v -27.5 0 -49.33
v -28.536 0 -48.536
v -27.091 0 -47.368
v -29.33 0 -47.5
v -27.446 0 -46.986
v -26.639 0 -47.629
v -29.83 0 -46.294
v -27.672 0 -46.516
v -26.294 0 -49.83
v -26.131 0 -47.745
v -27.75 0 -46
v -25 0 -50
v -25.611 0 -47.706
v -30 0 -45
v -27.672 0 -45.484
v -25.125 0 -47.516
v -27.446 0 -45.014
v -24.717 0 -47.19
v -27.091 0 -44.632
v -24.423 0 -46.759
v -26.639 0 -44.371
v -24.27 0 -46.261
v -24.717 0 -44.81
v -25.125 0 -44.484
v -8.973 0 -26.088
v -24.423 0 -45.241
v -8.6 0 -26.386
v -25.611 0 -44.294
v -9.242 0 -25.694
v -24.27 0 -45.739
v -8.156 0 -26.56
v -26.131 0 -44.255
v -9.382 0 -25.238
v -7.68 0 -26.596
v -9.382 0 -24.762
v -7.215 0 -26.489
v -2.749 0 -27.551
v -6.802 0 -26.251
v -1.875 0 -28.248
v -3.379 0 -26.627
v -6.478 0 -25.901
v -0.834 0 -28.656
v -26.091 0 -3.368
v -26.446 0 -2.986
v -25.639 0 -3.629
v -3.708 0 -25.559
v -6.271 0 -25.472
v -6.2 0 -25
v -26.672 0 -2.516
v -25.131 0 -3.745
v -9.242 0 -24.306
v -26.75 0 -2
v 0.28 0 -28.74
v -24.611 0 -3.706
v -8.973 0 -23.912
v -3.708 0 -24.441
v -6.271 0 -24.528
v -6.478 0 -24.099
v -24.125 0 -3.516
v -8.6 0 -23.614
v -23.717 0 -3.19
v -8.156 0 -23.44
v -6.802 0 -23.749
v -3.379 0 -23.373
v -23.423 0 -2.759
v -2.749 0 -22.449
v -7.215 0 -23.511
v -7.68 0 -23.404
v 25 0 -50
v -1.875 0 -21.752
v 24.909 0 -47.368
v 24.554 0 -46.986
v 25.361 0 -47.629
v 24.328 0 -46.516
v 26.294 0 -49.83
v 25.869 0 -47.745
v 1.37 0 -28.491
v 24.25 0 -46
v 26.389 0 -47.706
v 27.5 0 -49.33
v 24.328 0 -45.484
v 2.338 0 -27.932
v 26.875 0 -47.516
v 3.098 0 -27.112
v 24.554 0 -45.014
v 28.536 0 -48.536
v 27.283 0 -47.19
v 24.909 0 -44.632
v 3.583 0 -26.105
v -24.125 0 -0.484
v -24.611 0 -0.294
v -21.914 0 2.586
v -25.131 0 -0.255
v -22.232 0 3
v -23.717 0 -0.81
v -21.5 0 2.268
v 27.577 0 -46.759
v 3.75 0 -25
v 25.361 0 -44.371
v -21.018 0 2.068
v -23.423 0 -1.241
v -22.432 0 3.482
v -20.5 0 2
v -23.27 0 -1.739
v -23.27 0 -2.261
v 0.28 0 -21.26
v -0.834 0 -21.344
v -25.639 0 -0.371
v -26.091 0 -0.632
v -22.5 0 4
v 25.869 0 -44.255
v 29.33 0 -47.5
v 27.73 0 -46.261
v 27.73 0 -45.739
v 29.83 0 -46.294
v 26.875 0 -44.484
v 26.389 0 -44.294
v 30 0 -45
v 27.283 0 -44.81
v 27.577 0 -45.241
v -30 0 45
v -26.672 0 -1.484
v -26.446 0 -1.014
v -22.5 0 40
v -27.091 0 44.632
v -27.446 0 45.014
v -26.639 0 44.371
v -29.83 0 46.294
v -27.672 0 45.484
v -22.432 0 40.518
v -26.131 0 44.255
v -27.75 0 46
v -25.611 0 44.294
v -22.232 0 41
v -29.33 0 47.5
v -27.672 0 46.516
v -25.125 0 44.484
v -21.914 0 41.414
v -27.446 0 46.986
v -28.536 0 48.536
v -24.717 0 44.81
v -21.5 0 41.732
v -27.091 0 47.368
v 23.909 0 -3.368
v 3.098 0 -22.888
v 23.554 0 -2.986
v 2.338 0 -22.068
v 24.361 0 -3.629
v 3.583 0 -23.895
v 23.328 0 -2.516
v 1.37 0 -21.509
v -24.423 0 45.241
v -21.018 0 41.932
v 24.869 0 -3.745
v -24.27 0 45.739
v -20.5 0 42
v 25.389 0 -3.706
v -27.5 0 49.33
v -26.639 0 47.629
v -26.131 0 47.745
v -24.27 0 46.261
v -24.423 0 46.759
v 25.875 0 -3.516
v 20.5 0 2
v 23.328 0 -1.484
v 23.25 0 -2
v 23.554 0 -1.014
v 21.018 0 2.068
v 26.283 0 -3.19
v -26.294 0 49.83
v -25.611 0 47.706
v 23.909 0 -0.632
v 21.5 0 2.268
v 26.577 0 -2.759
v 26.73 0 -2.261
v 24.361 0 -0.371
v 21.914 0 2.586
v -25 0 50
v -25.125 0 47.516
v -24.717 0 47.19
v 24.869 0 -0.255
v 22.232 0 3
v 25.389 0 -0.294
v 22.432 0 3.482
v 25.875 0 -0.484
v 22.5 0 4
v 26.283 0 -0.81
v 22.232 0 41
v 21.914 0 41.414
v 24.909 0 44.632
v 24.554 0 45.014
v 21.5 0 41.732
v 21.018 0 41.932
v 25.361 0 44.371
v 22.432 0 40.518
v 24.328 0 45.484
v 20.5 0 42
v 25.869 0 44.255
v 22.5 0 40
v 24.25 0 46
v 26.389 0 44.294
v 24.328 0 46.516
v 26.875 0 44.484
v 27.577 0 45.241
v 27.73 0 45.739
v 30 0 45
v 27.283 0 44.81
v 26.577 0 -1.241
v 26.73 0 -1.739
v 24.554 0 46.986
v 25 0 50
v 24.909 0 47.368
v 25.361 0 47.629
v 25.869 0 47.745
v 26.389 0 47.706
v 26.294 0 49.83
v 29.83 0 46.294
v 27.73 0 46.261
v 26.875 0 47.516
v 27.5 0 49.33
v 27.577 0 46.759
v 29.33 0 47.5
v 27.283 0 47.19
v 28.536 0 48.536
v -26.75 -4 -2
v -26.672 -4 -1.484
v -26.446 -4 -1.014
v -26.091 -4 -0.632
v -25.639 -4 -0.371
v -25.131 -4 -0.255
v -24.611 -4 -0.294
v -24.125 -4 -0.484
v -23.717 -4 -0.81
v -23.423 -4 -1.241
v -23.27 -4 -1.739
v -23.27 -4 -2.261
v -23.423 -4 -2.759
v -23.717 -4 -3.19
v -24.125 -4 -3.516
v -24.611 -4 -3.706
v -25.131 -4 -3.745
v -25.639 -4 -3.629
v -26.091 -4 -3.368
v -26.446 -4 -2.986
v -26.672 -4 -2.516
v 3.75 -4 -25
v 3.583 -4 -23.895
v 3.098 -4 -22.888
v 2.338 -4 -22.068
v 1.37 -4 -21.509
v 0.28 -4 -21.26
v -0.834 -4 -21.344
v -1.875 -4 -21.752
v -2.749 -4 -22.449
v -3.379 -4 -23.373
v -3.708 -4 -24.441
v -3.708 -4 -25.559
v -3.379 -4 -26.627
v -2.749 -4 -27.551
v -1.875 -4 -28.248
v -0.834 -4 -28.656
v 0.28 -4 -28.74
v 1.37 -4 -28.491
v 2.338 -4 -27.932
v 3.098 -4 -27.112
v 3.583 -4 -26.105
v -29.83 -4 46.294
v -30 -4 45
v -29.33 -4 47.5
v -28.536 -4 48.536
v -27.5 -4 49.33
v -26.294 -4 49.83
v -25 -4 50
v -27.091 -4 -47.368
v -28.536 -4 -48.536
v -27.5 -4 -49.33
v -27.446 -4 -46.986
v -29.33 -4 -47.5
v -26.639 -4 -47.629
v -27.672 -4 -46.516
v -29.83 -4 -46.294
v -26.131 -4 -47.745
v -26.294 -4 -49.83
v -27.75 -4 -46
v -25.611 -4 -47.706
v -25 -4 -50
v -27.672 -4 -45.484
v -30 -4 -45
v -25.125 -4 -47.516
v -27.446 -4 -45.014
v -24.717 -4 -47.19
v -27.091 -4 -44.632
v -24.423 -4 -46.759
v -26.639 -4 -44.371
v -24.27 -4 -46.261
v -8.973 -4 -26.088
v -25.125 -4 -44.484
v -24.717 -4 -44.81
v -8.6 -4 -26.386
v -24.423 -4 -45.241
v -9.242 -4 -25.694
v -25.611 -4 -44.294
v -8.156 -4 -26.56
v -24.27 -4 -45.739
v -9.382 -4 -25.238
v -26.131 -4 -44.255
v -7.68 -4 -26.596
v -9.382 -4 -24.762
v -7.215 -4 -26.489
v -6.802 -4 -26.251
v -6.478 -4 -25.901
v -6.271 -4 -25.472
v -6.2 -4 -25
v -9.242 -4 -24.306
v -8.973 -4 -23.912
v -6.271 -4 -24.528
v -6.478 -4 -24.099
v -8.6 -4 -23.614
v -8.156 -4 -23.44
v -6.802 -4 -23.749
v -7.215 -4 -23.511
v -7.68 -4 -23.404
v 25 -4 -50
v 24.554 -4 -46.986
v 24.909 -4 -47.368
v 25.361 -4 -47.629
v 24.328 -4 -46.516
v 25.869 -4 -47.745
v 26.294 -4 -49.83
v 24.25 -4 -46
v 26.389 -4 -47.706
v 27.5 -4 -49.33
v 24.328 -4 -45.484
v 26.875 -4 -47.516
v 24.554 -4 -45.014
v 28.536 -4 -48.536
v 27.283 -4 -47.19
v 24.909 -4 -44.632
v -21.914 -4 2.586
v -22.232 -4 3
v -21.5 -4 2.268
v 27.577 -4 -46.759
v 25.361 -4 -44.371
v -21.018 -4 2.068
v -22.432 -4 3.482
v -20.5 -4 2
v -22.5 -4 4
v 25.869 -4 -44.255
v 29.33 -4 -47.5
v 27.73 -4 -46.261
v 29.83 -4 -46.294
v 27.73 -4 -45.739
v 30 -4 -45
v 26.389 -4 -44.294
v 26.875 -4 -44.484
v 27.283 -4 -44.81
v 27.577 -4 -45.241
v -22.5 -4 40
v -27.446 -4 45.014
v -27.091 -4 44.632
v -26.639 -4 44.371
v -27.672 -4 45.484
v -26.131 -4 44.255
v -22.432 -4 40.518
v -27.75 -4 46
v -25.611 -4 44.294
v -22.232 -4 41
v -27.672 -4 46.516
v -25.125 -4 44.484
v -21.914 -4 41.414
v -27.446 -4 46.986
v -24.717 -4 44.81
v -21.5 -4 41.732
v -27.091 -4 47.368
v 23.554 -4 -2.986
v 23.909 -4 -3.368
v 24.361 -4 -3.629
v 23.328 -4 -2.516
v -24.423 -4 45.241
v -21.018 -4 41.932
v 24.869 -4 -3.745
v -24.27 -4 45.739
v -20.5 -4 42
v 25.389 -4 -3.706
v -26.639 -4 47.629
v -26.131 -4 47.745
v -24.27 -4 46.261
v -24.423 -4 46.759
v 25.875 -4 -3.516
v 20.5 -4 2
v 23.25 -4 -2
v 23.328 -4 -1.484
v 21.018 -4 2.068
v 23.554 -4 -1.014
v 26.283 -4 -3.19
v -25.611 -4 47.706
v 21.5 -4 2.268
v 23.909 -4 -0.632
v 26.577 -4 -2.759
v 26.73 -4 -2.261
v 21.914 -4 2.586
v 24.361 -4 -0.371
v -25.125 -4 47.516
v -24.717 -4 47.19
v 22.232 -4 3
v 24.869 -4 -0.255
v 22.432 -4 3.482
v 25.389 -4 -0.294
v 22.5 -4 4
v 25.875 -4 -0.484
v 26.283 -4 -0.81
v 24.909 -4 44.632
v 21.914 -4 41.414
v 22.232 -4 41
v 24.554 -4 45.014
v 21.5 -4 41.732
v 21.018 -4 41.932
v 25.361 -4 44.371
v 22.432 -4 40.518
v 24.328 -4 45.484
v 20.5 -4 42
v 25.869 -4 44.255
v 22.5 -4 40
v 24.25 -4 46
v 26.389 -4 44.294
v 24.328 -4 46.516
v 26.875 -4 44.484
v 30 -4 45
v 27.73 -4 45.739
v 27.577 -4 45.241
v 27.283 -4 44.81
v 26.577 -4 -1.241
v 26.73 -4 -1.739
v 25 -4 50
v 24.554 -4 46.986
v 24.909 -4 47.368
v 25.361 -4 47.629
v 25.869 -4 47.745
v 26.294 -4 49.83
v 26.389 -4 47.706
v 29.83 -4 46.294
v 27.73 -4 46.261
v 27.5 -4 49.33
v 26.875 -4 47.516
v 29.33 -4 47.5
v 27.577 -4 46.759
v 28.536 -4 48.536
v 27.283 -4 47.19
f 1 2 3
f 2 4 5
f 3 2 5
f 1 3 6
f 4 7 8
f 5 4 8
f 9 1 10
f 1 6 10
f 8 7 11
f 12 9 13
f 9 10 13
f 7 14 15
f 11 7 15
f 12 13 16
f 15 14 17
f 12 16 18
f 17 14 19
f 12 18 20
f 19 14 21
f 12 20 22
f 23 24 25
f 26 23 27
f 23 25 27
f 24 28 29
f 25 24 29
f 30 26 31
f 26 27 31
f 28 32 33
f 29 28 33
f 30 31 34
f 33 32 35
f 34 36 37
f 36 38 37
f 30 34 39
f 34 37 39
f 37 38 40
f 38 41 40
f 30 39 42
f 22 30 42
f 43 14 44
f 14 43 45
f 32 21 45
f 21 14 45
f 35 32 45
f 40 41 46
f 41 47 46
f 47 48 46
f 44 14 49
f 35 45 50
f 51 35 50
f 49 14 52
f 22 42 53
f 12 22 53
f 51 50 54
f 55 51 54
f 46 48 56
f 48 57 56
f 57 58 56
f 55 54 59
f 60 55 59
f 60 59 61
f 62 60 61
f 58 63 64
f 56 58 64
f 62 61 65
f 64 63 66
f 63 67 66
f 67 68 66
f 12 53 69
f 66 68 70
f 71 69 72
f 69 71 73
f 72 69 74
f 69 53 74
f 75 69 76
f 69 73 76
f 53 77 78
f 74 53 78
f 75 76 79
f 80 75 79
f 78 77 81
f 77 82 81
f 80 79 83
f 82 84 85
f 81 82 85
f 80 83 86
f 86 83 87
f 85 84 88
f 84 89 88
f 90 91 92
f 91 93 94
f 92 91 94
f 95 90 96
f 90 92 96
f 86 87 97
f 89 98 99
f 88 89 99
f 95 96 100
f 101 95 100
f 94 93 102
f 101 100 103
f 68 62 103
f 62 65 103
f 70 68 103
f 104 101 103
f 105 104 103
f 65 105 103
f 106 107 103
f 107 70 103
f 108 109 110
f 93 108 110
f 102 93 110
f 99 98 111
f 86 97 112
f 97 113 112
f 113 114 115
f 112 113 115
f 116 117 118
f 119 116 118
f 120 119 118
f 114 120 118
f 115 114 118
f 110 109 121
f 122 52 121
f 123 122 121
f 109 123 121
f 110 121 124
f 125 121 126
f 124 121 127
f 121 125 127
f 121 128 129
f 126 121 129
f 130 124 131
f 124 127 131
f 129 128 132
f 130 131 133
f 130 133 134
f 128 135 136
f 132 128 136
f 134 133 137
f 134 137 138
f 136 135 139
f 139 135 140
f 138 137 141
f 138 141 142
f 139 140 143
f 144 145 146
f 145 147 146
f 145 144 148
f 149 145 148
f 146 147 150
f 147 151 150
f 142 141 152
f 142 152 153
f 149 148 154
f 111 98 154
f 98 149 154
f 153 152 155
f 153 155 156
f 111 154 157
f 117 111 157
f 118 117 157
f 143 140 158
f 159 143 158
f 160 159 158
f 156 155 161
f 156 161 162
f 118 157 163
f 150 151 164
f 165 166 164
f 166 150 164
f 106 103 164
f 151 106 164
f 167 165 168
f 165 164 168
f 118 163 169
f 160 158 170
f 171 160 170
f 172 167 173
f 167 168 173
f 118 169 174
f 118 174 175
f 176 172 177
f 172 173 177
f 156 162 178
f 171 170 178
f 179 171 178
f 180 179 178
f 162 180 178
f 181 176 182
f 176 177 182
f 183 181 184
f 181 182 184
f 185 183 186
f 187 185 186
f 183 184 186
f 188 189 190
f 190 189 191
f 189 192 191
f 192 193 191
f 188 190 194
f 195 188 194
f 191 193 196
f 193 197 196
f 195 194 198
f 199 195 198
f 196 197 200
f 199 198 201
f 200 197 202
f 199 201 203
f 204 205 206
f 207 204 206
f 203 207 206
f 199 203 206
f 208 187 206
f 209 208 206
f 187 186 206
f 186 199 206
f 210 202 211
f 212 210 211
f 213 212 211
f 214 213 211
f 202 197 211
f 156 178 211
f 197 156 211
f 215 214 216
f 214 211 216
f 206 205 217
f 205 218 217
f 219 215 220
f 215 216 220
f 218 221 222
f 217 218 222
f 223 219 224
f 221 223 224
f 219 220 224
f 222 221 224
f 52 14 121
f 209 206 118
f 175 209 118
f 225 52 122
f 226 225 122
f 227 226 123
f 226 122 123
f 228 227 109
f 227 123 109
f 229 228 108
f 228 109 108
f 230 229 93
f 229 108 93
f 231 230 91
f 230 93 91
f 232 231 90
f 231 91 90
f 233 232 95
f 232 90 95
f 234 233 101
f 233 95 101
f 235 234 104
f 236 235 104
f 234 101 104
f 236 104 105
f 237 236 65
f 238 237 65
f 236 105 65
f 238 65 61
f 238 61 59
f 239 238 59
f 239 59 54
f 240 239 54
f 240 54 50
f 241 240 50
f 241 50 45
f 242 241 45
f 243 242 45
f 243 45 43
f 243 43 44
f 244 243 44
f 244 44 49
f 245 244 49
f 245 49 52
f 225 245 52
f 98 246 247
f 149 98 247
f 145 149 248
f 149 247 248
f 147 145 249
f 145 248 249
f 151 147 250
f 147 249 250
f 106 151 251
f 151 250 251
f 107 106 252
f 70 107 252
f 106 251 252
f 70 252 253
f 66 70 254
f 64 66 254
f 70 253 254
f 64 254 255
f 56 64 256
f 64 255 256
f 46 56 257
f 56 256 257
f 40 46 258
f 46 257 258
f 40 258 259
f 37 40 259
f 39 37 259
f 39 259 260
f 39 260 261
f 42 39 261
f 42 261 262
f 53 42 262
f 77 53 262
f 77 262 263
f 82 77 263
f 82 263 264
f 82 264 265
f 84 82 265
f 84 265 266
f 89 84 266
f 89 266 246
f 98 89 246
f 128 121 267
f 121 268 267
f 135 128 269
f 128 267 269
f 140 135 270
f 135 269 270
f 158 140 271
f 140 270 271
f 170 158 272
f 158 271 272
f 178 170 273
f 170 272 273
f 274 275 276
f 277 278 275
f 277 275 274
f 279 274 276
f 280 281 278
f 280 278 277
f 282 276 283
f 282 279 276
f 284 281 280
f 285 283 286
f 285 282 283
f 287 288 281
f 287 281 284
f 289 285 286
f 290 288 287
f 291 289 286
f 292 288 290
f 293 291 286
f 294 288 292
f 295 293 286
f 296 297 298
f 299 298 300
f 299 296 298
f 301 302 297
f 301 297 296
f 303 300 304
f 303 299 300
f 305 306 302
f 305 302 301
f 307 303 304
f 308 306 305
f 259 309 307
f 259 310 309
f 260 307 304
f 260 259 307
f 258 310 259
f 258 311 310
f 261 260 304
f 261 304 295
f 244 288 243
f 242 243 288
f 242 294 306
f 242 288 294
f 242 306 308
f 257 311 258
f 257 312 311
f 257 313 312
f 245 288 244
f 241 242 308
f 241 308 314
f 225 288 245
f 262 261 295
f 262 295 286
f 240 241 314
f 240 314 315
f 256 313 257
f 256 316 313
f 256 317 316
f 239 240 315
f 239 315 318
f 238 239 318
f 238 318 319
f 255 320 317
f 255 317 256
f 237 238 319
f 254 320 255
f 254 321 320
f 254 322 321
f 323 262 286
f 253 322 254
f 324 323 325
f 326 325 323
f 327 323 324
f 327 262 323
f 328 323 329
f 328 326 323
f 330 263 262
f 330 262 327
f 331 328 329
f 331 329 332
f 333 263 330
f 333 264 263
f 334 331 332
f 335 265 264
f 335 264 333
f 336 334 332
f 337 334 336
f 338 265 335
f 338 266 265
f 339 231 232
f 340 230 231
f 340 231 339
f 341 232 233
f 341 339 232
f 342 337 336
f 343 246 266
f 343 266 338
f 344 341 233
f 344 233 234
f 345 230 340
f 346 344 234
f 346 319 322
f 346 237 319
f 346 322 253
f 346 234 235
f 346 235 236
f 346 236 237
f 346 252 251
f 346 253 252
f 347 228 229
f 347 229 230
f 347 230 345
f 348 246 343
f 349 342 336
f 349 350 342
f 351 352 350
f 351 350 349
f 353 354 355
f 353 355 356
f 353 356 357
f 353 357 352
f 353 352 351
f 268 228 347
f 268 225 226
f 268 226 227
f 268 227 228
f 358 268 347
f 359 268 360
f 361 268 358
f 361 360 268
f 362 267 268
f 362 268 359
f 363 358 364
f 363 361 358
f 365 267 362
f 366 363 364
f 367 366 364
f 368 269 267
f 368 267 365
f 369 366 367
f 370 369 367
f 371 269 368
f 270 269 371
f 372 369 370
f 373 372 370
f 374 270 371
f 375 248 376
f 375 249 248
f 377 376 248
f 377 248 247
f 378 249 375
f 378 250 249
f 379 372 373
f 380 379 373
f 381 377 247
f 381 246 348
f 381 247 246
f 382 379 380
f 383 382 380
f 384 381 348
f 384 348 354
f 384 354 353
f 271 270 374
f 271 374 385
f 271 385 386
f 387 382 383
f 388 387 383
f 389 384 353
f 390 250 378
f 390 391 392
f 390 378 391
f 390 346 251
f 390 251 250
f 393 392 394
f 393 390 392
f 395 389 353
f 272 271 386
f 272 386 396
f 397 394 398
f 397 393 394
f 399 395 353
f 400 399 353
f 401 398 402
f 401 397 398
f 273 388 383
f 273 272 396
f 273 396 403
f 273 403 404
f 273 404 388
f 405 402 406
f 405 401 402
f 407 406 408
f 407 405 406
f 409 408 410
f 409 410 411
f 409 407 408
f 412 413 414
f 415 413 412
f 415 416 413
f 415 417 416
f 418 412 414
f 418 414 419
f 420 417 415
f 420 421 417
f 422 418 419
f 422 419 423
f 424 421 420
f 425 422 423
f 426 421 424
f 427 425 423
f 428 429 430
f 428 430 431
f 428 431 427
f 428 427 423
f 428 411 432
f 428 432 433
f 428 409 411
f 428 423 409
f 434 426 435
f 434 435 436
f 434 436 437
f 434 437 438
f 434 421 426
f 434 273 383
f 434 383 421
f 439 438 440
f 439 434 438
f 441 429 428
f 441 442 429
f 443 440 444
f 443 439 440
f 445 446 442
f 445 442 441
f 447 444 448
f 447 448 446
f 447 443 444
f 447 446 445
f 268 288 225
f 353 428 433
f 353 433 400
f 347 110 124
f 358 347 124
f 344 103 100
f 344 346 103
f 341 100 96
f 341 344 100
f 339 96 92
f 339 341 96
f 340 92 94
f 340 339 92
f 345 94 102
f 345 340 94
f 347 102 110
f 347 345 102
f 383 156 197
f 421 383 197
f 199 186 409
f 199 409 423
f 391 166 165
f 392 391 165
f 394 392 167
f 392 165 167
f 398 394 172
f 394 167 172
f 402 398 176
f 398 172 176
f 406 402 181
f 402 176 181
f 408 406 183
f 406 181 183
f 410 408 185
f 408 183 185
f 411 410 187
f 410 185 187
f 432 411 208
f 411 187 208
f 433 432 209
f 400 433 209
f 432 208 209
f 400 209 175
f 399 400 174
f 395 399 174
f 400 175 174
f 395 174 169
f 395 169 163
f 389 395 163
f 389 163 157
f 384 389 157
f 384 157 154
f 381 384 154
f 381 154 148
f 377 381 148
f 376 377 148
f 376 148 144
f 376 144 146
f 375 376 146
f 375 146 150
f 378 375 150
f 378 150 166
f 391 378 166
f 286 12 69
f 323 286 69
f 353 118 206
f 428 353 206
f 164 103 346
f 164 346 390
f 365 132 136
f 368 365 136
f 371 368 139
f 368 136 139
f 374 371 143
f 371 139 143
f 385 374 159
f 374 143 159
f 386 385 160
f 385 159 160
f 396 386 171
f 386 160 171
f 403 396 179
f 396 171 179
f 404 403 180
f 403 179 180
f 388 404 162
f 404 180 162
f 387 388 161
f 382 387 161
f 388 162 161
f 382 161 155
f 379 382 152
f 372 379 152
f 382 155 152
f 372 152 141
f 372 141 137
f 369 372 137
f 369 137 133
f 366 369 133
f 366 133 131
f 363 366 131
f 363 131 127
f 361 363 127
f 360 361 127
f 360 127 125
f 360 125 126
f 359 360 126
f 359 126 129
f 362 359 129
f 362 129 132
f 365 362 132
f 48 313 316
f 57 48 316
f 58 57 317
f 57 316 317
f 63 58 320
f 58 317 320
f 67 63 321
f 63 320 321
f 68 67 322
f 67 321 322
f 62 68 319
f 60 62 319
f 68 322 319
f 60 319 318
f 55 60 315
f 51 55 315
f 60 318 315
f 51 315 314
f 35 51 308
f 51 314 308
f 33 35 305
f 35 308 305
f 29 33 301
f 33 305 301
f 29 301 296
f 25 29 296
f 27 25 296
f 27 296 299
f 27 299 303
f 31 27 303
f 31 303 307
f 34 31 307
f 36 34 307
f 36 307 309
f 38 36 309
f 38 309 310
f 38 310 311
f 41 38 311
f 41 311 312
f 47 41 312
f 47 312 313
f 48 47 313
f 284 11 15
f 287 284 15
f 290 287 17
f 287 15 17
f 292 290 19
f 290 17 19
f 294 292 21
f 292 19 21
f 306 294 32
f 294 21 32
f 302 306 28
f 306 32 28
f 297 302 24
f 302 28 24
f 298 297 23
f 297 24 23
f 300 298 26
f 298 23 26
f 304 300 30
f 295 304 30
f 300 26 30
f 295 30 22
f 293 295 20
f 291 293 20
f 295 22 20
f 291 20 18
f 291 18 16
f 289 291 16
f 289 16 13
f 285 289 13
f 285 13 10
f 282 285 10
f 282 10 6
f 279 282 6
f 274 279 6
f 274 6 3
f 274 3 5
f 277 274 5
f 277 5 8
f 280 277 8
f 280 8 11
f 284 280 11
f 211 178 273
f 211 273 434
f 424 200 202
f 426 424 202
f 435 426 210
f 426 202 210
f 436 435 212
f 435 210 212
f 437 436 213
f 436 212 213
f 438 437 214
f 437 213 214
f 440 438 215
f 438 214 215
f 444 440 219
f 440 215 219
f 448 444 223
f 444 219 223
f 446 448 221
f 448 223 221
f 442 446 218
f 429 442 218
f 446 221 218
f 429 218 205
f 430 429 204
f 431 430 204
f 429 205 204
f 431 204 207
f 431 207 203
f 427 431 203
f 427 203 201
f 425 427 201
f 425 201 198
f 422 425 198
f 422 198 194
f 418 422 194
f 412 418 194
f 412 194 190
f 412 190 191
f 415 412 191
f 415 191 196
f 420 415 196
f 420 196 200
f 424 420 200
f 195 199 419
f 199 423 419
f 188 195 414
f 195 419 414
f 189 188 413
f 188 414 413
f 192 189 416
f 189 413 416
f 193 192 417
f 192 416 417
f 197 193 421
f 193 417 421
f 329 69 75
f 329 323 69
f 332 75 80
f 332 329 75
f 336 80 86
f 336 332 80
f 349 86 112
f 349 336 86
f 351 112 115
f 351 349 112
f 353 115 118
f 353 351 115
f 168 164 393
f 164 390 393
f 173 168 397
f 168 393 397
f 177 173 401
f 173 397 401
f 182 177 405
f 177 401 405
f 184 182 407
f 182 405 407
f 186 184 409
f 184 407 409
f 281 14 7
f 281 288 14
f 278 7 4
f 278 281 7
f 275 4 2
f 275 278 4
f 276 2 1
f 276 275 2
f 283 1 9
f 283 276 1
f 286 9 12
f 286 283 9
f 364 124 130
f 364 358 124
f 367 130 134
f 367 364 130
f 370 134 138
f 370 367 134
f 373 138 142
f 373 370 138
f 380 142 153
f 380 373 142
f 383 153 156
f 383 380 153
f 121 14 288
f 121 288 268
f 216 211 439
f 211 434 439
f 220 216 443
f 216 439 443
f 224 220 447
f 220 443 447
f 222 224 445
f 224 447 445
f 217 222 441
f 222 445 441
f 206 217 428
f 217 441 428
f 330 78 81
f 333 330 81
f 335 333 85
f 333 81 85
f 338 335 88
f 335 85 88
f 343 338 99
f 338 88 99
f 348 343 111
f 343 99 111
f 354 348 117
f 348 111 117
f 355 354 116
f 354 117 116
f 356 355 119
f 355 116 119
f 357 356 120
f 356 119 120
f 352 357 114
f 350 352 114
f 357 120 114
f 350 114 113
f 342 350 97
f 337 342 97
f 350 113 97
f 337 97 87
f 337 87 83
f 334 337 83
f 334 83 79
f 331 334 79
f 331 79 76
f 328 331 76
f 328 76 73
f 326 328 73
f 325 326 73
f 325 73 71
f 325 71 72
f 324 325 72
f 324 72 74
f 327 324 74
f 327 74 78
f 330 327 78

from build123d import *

# Parameters (mm, degrees)
F0_W      = 60
F0_H      = 100
F0_W_2    = 45
F0_H_2    = 40
F1_DEPTH  = 4
F3_D      = 3.5
F3_DEPTH  = 25
F3_TIP    = 1.0515060833
F5_R      = 5
F6_R      = 2
F8_D      = 3.5
F8_DEPTH  = 25
F8_TIP    = 1.0515060833
F4_R      = 3.75
F4_R_2    = 1.6
F9_DEPTH  = 25
F10_DEPTH = 25


# Not quite as in the source:
# - a feature names something its author has since deleted; it is built from what else it names


with BuildPart() as f1:
    # F0 (on Front) → F1 (new body)
    with BuildSketch(Plane.XZ):
        Rectangle(F0_W, F0_H)
        with Locations((0, 22)):
            Rectangle(F0_W_2, F0_H_2, mode=Mode.SUBTRACT)
    extrude(amount=F1_DEPTH)

    # F3
    with Locations(Plane.XZ.offset(4)):
        with Locations((-26, 46), (26, 46), (26, -46), (-26, -46)):
            Hole(F3_D / 2, depth=F3_DEPTH)
            with Locations((0, 0, -(F3_DEPTH + F3_TIP / 2))):  # 118° drill point
                Cone(0, F3_D / 2, F3_TIP, mode=Mode.SUBTRACT)

    # F5
    f5_edges = [f1.edges().sort_by_distance(p)[0] for p in [
        (-30, -2, 50),
        (-30, -2, -50),
        (30, -2, -50),
        (30, -2, 50),
    ]]
    fillet(f5_edges, radius=F5_R)

    # F6
    f6_edges = [f1.edges().sort_by_distance(p)[0] for p in [
        (-22.5, -2, 2),
        (-22.5, -2, 42),
        (22.5, -2, 42),
        (22.5, -2, 2),
    ]]
    fillet(f6_edges, radius=F6_R)

    # F8
    with Locations(Plane.XZ.offset(4)):
        with Locations((-25, -2), (25, -2)):
            Hole(F8_D / 2, depth=F8_DEPTH)
            with Locations((0, 0, -(F8_DEPTH + F8_TIP / 2))):  # 118° drill point
                Cone(0, F8_D / 2, F8_TIP, mode=Mode.SUBTRACT)

    # F4 (on face) → F9 (cut)
    with BuildSketch(Plane.XZ.offset(4)):
        with Locations((0, -25)):
            Circle(F4_R)
        with Locations((-7.8, -25)):
            Circle(F4_R_2)
    extrude(amount=-F9_DEPTH, mode=Mode.SUBTRACT)

    # F4 (on face) → F10 (cut)
    with BuildSketch(Plane.XZ.offset(4)):
        with Locations((0, -25)):
            Circle(F4_R)
        with Locations((-7.8, -25)):
            Circle(F4_R_2)
    extrude(amount=-F10_DEPTH, mode=Mode.SUBTRACT)


solid = f1.part
